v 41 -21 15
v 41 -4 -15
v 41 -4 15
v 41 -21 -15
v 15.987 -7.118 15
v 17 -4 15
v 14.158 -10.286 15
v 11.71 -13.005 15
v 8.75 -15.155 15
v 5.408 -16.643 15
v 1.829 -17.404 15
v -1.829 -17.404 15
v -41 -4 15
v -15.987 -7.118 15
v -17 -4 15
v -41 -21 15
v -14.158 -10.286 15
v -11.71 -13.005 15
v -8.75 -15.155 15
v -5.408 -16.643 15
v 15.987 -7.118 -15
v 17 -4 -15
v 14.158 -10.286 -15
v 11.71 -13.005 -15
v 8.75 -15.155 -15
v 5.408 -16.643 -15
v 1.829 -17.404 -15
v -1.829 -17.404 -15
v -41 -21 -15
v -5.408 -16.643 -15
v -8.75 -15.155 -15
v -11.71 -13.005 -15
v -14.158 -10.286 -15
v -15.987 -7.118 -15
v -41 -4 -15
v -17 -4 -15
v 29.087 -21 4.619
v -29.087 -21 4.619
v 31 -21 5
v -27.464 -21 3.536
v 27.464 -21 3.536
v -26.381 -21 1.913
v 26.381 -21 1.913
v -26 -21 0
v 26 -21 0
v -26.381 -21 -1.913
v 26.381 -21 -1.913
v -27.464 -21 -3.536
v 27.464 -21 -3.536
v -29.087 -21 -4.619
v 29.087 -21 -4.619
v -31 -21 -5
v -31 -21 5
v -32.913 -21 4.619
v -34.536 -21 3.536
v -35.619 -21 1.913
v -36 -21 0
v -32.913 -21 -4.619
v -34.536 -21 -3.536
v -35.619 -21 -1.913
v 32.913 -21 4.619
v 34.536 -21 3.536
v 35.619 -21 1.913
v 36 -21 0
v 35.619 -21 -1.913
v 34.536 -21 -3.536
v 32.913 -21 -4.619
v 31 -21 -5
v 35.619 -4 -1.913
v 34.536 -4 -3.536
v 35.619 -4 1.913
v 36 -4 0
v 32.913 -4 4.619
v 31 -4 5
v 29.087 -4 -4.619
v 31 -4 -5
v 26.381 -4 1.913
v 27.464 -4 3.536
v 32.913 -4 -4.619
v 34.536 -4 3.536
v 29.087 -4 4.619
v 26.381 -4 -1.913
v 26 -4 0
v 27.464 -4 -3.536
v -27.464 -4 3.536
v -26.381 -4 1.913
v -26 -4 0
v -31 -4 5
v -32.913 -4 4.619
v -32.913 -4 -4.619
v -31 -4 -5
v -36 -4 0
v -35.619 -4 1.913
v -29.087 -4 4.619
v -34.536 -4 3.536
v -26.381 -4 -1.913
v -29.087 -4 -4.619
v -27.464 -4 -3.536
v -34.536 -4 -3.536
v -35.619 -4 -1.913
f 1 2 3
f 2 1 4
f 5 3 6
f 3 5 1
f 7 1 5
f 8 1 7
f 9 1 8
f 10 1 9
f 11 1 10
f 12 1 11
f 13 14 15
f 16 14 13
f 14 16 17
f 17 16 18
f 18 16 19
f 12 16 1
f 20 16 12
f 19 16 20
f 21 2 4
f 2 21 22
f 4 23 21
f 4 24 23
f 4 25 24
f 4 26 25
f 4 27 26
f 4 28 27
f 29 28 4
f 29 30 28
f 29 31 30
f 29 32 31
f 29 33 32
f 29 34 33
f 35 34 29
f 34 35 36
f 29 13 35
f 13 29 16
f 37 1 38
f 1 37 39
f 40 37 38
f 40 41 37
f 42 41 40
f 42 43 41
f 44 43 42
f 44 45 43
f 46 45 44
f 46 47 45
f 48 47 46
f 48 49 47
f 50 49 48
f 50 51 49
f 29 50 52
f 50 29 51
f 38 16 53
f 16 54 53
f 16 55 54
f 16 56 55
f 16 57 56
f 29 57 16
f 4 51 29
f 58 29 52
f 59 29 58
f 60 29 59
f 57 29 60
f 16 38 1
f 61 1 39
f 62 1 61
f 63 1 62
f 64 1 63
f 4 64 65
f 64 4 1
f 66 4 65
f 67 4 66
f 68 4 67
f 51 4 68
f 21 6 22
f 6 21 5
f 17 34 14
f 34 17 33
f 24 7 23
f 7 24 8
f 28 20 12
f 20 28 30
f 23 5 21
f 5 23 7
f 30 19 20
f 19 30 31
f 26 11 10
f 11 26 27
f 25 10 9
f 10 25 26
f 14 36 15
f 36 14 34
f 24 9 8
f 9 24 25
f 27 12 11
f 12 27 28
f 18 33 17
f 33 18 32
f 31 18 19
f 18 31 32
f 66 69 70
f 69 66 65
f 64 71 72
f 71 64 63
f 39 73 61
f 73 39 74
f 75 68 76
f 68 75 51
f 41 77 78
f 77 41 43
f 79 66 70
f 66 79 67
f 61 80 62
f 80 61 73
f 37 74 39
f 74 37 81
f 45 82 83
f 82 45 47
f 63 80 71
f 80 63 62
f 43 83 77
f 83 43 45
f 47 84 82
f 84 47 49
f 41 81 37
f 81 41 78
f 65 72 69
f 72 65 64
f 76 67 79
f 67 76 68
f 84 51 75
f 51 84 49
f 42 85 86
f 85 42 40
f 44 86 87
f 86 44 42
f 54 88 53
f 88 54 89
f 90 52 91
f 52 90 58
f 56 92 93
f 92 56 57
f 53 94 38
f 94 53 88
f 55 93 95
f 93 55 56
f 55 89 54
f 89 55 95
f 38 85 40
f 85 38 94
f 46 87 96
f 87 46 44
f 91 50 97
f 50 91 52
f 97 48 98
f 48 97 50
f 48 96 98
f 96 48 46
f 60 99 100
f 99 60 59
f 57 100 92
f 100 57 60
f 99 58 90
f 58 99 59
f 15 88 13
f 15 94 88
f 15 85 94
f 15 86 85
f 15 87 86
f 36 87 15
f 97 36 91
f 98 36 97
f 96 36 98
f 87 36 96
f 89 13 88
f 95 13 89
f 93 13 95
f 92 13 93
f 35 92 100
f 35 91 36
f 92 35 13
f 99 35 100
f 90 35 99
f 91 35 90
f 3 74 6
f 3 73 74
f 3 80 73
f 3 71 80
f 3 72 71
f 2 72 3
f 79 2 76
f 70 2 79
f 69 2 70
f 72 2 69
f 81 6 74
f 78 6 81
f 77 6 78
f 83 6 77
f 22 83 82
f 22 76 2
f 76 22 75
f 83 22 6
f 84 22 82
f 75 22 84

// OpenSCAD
difference(){
  
    translate([0,0,0]) cube([62+20,42,30],center=true);
    cylinder(31,35/2,35/2,center=true);
      //cylinder(30,45,45);
    translate([62/2,50,0]) rotate([90,0,0]) cylinder(100,10/2,10/2);
    translate([-62/2,50,0]) rotate([90,0,0]) cylinder(100,10/2,10/2);
    cube([90,8,40],center=true);
    
    translate([0,50,0]) cube([100,100,100],center=true);
    }
    
